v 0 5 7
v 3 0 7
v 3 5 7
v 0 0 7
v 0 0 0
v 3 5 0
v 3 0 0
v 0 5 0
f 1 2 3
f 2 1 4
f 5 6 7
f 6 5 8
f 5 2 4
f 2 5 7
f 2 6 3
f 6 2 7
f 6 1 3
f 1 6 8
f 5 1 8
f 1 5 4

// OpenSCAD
// Generated by SolidPython 1.0.1 on 2020-07-29 00:46:54


cube(size = [3, 5, 7]);
/***********************************************
*********      SolidPython code:      **********
************************************************
 
# import packages: SolidPython
from solid import *
from solid.utils import *
from itertools import chain, combinations, permutations


class Resize:

    def __init__(self, scad_file):
        self.scad_file = scad_file
        #self.scad_file = import_scad(scad_file)
        # cone/cylinder param:
        self.r1 = 0
        self.r2 = 0
        self.h = 0
        # rectangular prism param:
        self.w = 0
        self.l = 0
        # ellipse param:
        self.r = 0

    # import OpenScad code (file name corresponds to shape)


    # classify shape + parameters
    def assign(self, param1, param2, param3):
        if self.scad_file == 'cone.scad':
            self.r1 = param1
            self.r2 = param2
            self.h = param3
        elif self.scad_file == 'cylinder.scad':
            self.r1 = param1
            self.r2 = param2
            self.h = param3
        elif self.scad_file == 'rectangularPrism.scad':
            self.h = param1
            self.l = param2
            self.w = param3
        else:
            self.r = param1
            self.h = param2

    # resize parameters
    def iterate(self):
        x = range(3, 20, 2)
        i = 1
        if self.scad_file == 'cone.scad':
            tempList = list(permutations(x, 2))
            for temp in tempList:
                param1 = temp[0]
                param2 = temp[1]
                filepath = 'produced_scad_files/' + 'cone' + str(param1) + '_' + str(param2) + '_' + '.scad'
                scad_render_to_file(cylinder(h=param1, r1=param2, r2=0), filepath)

        elif self.scad_file == 'cylinder.scad':
            tempList = list(permutations(x, 3))
            for temp in tempList:
                param1 = temp[0]
                param2 = temp[1]
                filepath = 'produced_scad_files/' + 'cylinder' + str(param1) + '_' + str(param2) + '_' + '.scad'
                scad_render_to_file(cylinder(h=param1, r1=param2, r2=param2), filepath)

        elif self.scad_file == 'rectangularPrism.scad':
            tempList = list(permutations(x, 3))
            for temp in tempList:
                param1 = temp[0]
                param2 = temp[1]
                param3 = temp[2]
                filepath = 'produced_scad_files/' + 'rectangularPrism' + str(param1) + '_' + str(param2) + '_' + str(
                    param3) + '.scad'
                scad_render_to_file(cube(size=(param1, param2, param3)), filepath)

        elif self.scad_file == 'ellipse.scad':
            tempList = list(permutations(x, 4))
            for temp in tempList:
                param1 = temp[0]
                param2 = temp[1]
                param3 = temp[2]
                param4 = temp[3]
                filepath = 'produced_scad_files/' + 'ellipse' + str(param1) + '_' + str(param2) + '_' + str(param3) + '_' + str(param4) + '.scad'
                scad_render_to_file(scale([param1, param2, param3])(sphere(r=param4)), filepath)

    def render_to_scadfile(self):
        scad_render_to_file(scad, 'example.scad') 
 
************************************************/
